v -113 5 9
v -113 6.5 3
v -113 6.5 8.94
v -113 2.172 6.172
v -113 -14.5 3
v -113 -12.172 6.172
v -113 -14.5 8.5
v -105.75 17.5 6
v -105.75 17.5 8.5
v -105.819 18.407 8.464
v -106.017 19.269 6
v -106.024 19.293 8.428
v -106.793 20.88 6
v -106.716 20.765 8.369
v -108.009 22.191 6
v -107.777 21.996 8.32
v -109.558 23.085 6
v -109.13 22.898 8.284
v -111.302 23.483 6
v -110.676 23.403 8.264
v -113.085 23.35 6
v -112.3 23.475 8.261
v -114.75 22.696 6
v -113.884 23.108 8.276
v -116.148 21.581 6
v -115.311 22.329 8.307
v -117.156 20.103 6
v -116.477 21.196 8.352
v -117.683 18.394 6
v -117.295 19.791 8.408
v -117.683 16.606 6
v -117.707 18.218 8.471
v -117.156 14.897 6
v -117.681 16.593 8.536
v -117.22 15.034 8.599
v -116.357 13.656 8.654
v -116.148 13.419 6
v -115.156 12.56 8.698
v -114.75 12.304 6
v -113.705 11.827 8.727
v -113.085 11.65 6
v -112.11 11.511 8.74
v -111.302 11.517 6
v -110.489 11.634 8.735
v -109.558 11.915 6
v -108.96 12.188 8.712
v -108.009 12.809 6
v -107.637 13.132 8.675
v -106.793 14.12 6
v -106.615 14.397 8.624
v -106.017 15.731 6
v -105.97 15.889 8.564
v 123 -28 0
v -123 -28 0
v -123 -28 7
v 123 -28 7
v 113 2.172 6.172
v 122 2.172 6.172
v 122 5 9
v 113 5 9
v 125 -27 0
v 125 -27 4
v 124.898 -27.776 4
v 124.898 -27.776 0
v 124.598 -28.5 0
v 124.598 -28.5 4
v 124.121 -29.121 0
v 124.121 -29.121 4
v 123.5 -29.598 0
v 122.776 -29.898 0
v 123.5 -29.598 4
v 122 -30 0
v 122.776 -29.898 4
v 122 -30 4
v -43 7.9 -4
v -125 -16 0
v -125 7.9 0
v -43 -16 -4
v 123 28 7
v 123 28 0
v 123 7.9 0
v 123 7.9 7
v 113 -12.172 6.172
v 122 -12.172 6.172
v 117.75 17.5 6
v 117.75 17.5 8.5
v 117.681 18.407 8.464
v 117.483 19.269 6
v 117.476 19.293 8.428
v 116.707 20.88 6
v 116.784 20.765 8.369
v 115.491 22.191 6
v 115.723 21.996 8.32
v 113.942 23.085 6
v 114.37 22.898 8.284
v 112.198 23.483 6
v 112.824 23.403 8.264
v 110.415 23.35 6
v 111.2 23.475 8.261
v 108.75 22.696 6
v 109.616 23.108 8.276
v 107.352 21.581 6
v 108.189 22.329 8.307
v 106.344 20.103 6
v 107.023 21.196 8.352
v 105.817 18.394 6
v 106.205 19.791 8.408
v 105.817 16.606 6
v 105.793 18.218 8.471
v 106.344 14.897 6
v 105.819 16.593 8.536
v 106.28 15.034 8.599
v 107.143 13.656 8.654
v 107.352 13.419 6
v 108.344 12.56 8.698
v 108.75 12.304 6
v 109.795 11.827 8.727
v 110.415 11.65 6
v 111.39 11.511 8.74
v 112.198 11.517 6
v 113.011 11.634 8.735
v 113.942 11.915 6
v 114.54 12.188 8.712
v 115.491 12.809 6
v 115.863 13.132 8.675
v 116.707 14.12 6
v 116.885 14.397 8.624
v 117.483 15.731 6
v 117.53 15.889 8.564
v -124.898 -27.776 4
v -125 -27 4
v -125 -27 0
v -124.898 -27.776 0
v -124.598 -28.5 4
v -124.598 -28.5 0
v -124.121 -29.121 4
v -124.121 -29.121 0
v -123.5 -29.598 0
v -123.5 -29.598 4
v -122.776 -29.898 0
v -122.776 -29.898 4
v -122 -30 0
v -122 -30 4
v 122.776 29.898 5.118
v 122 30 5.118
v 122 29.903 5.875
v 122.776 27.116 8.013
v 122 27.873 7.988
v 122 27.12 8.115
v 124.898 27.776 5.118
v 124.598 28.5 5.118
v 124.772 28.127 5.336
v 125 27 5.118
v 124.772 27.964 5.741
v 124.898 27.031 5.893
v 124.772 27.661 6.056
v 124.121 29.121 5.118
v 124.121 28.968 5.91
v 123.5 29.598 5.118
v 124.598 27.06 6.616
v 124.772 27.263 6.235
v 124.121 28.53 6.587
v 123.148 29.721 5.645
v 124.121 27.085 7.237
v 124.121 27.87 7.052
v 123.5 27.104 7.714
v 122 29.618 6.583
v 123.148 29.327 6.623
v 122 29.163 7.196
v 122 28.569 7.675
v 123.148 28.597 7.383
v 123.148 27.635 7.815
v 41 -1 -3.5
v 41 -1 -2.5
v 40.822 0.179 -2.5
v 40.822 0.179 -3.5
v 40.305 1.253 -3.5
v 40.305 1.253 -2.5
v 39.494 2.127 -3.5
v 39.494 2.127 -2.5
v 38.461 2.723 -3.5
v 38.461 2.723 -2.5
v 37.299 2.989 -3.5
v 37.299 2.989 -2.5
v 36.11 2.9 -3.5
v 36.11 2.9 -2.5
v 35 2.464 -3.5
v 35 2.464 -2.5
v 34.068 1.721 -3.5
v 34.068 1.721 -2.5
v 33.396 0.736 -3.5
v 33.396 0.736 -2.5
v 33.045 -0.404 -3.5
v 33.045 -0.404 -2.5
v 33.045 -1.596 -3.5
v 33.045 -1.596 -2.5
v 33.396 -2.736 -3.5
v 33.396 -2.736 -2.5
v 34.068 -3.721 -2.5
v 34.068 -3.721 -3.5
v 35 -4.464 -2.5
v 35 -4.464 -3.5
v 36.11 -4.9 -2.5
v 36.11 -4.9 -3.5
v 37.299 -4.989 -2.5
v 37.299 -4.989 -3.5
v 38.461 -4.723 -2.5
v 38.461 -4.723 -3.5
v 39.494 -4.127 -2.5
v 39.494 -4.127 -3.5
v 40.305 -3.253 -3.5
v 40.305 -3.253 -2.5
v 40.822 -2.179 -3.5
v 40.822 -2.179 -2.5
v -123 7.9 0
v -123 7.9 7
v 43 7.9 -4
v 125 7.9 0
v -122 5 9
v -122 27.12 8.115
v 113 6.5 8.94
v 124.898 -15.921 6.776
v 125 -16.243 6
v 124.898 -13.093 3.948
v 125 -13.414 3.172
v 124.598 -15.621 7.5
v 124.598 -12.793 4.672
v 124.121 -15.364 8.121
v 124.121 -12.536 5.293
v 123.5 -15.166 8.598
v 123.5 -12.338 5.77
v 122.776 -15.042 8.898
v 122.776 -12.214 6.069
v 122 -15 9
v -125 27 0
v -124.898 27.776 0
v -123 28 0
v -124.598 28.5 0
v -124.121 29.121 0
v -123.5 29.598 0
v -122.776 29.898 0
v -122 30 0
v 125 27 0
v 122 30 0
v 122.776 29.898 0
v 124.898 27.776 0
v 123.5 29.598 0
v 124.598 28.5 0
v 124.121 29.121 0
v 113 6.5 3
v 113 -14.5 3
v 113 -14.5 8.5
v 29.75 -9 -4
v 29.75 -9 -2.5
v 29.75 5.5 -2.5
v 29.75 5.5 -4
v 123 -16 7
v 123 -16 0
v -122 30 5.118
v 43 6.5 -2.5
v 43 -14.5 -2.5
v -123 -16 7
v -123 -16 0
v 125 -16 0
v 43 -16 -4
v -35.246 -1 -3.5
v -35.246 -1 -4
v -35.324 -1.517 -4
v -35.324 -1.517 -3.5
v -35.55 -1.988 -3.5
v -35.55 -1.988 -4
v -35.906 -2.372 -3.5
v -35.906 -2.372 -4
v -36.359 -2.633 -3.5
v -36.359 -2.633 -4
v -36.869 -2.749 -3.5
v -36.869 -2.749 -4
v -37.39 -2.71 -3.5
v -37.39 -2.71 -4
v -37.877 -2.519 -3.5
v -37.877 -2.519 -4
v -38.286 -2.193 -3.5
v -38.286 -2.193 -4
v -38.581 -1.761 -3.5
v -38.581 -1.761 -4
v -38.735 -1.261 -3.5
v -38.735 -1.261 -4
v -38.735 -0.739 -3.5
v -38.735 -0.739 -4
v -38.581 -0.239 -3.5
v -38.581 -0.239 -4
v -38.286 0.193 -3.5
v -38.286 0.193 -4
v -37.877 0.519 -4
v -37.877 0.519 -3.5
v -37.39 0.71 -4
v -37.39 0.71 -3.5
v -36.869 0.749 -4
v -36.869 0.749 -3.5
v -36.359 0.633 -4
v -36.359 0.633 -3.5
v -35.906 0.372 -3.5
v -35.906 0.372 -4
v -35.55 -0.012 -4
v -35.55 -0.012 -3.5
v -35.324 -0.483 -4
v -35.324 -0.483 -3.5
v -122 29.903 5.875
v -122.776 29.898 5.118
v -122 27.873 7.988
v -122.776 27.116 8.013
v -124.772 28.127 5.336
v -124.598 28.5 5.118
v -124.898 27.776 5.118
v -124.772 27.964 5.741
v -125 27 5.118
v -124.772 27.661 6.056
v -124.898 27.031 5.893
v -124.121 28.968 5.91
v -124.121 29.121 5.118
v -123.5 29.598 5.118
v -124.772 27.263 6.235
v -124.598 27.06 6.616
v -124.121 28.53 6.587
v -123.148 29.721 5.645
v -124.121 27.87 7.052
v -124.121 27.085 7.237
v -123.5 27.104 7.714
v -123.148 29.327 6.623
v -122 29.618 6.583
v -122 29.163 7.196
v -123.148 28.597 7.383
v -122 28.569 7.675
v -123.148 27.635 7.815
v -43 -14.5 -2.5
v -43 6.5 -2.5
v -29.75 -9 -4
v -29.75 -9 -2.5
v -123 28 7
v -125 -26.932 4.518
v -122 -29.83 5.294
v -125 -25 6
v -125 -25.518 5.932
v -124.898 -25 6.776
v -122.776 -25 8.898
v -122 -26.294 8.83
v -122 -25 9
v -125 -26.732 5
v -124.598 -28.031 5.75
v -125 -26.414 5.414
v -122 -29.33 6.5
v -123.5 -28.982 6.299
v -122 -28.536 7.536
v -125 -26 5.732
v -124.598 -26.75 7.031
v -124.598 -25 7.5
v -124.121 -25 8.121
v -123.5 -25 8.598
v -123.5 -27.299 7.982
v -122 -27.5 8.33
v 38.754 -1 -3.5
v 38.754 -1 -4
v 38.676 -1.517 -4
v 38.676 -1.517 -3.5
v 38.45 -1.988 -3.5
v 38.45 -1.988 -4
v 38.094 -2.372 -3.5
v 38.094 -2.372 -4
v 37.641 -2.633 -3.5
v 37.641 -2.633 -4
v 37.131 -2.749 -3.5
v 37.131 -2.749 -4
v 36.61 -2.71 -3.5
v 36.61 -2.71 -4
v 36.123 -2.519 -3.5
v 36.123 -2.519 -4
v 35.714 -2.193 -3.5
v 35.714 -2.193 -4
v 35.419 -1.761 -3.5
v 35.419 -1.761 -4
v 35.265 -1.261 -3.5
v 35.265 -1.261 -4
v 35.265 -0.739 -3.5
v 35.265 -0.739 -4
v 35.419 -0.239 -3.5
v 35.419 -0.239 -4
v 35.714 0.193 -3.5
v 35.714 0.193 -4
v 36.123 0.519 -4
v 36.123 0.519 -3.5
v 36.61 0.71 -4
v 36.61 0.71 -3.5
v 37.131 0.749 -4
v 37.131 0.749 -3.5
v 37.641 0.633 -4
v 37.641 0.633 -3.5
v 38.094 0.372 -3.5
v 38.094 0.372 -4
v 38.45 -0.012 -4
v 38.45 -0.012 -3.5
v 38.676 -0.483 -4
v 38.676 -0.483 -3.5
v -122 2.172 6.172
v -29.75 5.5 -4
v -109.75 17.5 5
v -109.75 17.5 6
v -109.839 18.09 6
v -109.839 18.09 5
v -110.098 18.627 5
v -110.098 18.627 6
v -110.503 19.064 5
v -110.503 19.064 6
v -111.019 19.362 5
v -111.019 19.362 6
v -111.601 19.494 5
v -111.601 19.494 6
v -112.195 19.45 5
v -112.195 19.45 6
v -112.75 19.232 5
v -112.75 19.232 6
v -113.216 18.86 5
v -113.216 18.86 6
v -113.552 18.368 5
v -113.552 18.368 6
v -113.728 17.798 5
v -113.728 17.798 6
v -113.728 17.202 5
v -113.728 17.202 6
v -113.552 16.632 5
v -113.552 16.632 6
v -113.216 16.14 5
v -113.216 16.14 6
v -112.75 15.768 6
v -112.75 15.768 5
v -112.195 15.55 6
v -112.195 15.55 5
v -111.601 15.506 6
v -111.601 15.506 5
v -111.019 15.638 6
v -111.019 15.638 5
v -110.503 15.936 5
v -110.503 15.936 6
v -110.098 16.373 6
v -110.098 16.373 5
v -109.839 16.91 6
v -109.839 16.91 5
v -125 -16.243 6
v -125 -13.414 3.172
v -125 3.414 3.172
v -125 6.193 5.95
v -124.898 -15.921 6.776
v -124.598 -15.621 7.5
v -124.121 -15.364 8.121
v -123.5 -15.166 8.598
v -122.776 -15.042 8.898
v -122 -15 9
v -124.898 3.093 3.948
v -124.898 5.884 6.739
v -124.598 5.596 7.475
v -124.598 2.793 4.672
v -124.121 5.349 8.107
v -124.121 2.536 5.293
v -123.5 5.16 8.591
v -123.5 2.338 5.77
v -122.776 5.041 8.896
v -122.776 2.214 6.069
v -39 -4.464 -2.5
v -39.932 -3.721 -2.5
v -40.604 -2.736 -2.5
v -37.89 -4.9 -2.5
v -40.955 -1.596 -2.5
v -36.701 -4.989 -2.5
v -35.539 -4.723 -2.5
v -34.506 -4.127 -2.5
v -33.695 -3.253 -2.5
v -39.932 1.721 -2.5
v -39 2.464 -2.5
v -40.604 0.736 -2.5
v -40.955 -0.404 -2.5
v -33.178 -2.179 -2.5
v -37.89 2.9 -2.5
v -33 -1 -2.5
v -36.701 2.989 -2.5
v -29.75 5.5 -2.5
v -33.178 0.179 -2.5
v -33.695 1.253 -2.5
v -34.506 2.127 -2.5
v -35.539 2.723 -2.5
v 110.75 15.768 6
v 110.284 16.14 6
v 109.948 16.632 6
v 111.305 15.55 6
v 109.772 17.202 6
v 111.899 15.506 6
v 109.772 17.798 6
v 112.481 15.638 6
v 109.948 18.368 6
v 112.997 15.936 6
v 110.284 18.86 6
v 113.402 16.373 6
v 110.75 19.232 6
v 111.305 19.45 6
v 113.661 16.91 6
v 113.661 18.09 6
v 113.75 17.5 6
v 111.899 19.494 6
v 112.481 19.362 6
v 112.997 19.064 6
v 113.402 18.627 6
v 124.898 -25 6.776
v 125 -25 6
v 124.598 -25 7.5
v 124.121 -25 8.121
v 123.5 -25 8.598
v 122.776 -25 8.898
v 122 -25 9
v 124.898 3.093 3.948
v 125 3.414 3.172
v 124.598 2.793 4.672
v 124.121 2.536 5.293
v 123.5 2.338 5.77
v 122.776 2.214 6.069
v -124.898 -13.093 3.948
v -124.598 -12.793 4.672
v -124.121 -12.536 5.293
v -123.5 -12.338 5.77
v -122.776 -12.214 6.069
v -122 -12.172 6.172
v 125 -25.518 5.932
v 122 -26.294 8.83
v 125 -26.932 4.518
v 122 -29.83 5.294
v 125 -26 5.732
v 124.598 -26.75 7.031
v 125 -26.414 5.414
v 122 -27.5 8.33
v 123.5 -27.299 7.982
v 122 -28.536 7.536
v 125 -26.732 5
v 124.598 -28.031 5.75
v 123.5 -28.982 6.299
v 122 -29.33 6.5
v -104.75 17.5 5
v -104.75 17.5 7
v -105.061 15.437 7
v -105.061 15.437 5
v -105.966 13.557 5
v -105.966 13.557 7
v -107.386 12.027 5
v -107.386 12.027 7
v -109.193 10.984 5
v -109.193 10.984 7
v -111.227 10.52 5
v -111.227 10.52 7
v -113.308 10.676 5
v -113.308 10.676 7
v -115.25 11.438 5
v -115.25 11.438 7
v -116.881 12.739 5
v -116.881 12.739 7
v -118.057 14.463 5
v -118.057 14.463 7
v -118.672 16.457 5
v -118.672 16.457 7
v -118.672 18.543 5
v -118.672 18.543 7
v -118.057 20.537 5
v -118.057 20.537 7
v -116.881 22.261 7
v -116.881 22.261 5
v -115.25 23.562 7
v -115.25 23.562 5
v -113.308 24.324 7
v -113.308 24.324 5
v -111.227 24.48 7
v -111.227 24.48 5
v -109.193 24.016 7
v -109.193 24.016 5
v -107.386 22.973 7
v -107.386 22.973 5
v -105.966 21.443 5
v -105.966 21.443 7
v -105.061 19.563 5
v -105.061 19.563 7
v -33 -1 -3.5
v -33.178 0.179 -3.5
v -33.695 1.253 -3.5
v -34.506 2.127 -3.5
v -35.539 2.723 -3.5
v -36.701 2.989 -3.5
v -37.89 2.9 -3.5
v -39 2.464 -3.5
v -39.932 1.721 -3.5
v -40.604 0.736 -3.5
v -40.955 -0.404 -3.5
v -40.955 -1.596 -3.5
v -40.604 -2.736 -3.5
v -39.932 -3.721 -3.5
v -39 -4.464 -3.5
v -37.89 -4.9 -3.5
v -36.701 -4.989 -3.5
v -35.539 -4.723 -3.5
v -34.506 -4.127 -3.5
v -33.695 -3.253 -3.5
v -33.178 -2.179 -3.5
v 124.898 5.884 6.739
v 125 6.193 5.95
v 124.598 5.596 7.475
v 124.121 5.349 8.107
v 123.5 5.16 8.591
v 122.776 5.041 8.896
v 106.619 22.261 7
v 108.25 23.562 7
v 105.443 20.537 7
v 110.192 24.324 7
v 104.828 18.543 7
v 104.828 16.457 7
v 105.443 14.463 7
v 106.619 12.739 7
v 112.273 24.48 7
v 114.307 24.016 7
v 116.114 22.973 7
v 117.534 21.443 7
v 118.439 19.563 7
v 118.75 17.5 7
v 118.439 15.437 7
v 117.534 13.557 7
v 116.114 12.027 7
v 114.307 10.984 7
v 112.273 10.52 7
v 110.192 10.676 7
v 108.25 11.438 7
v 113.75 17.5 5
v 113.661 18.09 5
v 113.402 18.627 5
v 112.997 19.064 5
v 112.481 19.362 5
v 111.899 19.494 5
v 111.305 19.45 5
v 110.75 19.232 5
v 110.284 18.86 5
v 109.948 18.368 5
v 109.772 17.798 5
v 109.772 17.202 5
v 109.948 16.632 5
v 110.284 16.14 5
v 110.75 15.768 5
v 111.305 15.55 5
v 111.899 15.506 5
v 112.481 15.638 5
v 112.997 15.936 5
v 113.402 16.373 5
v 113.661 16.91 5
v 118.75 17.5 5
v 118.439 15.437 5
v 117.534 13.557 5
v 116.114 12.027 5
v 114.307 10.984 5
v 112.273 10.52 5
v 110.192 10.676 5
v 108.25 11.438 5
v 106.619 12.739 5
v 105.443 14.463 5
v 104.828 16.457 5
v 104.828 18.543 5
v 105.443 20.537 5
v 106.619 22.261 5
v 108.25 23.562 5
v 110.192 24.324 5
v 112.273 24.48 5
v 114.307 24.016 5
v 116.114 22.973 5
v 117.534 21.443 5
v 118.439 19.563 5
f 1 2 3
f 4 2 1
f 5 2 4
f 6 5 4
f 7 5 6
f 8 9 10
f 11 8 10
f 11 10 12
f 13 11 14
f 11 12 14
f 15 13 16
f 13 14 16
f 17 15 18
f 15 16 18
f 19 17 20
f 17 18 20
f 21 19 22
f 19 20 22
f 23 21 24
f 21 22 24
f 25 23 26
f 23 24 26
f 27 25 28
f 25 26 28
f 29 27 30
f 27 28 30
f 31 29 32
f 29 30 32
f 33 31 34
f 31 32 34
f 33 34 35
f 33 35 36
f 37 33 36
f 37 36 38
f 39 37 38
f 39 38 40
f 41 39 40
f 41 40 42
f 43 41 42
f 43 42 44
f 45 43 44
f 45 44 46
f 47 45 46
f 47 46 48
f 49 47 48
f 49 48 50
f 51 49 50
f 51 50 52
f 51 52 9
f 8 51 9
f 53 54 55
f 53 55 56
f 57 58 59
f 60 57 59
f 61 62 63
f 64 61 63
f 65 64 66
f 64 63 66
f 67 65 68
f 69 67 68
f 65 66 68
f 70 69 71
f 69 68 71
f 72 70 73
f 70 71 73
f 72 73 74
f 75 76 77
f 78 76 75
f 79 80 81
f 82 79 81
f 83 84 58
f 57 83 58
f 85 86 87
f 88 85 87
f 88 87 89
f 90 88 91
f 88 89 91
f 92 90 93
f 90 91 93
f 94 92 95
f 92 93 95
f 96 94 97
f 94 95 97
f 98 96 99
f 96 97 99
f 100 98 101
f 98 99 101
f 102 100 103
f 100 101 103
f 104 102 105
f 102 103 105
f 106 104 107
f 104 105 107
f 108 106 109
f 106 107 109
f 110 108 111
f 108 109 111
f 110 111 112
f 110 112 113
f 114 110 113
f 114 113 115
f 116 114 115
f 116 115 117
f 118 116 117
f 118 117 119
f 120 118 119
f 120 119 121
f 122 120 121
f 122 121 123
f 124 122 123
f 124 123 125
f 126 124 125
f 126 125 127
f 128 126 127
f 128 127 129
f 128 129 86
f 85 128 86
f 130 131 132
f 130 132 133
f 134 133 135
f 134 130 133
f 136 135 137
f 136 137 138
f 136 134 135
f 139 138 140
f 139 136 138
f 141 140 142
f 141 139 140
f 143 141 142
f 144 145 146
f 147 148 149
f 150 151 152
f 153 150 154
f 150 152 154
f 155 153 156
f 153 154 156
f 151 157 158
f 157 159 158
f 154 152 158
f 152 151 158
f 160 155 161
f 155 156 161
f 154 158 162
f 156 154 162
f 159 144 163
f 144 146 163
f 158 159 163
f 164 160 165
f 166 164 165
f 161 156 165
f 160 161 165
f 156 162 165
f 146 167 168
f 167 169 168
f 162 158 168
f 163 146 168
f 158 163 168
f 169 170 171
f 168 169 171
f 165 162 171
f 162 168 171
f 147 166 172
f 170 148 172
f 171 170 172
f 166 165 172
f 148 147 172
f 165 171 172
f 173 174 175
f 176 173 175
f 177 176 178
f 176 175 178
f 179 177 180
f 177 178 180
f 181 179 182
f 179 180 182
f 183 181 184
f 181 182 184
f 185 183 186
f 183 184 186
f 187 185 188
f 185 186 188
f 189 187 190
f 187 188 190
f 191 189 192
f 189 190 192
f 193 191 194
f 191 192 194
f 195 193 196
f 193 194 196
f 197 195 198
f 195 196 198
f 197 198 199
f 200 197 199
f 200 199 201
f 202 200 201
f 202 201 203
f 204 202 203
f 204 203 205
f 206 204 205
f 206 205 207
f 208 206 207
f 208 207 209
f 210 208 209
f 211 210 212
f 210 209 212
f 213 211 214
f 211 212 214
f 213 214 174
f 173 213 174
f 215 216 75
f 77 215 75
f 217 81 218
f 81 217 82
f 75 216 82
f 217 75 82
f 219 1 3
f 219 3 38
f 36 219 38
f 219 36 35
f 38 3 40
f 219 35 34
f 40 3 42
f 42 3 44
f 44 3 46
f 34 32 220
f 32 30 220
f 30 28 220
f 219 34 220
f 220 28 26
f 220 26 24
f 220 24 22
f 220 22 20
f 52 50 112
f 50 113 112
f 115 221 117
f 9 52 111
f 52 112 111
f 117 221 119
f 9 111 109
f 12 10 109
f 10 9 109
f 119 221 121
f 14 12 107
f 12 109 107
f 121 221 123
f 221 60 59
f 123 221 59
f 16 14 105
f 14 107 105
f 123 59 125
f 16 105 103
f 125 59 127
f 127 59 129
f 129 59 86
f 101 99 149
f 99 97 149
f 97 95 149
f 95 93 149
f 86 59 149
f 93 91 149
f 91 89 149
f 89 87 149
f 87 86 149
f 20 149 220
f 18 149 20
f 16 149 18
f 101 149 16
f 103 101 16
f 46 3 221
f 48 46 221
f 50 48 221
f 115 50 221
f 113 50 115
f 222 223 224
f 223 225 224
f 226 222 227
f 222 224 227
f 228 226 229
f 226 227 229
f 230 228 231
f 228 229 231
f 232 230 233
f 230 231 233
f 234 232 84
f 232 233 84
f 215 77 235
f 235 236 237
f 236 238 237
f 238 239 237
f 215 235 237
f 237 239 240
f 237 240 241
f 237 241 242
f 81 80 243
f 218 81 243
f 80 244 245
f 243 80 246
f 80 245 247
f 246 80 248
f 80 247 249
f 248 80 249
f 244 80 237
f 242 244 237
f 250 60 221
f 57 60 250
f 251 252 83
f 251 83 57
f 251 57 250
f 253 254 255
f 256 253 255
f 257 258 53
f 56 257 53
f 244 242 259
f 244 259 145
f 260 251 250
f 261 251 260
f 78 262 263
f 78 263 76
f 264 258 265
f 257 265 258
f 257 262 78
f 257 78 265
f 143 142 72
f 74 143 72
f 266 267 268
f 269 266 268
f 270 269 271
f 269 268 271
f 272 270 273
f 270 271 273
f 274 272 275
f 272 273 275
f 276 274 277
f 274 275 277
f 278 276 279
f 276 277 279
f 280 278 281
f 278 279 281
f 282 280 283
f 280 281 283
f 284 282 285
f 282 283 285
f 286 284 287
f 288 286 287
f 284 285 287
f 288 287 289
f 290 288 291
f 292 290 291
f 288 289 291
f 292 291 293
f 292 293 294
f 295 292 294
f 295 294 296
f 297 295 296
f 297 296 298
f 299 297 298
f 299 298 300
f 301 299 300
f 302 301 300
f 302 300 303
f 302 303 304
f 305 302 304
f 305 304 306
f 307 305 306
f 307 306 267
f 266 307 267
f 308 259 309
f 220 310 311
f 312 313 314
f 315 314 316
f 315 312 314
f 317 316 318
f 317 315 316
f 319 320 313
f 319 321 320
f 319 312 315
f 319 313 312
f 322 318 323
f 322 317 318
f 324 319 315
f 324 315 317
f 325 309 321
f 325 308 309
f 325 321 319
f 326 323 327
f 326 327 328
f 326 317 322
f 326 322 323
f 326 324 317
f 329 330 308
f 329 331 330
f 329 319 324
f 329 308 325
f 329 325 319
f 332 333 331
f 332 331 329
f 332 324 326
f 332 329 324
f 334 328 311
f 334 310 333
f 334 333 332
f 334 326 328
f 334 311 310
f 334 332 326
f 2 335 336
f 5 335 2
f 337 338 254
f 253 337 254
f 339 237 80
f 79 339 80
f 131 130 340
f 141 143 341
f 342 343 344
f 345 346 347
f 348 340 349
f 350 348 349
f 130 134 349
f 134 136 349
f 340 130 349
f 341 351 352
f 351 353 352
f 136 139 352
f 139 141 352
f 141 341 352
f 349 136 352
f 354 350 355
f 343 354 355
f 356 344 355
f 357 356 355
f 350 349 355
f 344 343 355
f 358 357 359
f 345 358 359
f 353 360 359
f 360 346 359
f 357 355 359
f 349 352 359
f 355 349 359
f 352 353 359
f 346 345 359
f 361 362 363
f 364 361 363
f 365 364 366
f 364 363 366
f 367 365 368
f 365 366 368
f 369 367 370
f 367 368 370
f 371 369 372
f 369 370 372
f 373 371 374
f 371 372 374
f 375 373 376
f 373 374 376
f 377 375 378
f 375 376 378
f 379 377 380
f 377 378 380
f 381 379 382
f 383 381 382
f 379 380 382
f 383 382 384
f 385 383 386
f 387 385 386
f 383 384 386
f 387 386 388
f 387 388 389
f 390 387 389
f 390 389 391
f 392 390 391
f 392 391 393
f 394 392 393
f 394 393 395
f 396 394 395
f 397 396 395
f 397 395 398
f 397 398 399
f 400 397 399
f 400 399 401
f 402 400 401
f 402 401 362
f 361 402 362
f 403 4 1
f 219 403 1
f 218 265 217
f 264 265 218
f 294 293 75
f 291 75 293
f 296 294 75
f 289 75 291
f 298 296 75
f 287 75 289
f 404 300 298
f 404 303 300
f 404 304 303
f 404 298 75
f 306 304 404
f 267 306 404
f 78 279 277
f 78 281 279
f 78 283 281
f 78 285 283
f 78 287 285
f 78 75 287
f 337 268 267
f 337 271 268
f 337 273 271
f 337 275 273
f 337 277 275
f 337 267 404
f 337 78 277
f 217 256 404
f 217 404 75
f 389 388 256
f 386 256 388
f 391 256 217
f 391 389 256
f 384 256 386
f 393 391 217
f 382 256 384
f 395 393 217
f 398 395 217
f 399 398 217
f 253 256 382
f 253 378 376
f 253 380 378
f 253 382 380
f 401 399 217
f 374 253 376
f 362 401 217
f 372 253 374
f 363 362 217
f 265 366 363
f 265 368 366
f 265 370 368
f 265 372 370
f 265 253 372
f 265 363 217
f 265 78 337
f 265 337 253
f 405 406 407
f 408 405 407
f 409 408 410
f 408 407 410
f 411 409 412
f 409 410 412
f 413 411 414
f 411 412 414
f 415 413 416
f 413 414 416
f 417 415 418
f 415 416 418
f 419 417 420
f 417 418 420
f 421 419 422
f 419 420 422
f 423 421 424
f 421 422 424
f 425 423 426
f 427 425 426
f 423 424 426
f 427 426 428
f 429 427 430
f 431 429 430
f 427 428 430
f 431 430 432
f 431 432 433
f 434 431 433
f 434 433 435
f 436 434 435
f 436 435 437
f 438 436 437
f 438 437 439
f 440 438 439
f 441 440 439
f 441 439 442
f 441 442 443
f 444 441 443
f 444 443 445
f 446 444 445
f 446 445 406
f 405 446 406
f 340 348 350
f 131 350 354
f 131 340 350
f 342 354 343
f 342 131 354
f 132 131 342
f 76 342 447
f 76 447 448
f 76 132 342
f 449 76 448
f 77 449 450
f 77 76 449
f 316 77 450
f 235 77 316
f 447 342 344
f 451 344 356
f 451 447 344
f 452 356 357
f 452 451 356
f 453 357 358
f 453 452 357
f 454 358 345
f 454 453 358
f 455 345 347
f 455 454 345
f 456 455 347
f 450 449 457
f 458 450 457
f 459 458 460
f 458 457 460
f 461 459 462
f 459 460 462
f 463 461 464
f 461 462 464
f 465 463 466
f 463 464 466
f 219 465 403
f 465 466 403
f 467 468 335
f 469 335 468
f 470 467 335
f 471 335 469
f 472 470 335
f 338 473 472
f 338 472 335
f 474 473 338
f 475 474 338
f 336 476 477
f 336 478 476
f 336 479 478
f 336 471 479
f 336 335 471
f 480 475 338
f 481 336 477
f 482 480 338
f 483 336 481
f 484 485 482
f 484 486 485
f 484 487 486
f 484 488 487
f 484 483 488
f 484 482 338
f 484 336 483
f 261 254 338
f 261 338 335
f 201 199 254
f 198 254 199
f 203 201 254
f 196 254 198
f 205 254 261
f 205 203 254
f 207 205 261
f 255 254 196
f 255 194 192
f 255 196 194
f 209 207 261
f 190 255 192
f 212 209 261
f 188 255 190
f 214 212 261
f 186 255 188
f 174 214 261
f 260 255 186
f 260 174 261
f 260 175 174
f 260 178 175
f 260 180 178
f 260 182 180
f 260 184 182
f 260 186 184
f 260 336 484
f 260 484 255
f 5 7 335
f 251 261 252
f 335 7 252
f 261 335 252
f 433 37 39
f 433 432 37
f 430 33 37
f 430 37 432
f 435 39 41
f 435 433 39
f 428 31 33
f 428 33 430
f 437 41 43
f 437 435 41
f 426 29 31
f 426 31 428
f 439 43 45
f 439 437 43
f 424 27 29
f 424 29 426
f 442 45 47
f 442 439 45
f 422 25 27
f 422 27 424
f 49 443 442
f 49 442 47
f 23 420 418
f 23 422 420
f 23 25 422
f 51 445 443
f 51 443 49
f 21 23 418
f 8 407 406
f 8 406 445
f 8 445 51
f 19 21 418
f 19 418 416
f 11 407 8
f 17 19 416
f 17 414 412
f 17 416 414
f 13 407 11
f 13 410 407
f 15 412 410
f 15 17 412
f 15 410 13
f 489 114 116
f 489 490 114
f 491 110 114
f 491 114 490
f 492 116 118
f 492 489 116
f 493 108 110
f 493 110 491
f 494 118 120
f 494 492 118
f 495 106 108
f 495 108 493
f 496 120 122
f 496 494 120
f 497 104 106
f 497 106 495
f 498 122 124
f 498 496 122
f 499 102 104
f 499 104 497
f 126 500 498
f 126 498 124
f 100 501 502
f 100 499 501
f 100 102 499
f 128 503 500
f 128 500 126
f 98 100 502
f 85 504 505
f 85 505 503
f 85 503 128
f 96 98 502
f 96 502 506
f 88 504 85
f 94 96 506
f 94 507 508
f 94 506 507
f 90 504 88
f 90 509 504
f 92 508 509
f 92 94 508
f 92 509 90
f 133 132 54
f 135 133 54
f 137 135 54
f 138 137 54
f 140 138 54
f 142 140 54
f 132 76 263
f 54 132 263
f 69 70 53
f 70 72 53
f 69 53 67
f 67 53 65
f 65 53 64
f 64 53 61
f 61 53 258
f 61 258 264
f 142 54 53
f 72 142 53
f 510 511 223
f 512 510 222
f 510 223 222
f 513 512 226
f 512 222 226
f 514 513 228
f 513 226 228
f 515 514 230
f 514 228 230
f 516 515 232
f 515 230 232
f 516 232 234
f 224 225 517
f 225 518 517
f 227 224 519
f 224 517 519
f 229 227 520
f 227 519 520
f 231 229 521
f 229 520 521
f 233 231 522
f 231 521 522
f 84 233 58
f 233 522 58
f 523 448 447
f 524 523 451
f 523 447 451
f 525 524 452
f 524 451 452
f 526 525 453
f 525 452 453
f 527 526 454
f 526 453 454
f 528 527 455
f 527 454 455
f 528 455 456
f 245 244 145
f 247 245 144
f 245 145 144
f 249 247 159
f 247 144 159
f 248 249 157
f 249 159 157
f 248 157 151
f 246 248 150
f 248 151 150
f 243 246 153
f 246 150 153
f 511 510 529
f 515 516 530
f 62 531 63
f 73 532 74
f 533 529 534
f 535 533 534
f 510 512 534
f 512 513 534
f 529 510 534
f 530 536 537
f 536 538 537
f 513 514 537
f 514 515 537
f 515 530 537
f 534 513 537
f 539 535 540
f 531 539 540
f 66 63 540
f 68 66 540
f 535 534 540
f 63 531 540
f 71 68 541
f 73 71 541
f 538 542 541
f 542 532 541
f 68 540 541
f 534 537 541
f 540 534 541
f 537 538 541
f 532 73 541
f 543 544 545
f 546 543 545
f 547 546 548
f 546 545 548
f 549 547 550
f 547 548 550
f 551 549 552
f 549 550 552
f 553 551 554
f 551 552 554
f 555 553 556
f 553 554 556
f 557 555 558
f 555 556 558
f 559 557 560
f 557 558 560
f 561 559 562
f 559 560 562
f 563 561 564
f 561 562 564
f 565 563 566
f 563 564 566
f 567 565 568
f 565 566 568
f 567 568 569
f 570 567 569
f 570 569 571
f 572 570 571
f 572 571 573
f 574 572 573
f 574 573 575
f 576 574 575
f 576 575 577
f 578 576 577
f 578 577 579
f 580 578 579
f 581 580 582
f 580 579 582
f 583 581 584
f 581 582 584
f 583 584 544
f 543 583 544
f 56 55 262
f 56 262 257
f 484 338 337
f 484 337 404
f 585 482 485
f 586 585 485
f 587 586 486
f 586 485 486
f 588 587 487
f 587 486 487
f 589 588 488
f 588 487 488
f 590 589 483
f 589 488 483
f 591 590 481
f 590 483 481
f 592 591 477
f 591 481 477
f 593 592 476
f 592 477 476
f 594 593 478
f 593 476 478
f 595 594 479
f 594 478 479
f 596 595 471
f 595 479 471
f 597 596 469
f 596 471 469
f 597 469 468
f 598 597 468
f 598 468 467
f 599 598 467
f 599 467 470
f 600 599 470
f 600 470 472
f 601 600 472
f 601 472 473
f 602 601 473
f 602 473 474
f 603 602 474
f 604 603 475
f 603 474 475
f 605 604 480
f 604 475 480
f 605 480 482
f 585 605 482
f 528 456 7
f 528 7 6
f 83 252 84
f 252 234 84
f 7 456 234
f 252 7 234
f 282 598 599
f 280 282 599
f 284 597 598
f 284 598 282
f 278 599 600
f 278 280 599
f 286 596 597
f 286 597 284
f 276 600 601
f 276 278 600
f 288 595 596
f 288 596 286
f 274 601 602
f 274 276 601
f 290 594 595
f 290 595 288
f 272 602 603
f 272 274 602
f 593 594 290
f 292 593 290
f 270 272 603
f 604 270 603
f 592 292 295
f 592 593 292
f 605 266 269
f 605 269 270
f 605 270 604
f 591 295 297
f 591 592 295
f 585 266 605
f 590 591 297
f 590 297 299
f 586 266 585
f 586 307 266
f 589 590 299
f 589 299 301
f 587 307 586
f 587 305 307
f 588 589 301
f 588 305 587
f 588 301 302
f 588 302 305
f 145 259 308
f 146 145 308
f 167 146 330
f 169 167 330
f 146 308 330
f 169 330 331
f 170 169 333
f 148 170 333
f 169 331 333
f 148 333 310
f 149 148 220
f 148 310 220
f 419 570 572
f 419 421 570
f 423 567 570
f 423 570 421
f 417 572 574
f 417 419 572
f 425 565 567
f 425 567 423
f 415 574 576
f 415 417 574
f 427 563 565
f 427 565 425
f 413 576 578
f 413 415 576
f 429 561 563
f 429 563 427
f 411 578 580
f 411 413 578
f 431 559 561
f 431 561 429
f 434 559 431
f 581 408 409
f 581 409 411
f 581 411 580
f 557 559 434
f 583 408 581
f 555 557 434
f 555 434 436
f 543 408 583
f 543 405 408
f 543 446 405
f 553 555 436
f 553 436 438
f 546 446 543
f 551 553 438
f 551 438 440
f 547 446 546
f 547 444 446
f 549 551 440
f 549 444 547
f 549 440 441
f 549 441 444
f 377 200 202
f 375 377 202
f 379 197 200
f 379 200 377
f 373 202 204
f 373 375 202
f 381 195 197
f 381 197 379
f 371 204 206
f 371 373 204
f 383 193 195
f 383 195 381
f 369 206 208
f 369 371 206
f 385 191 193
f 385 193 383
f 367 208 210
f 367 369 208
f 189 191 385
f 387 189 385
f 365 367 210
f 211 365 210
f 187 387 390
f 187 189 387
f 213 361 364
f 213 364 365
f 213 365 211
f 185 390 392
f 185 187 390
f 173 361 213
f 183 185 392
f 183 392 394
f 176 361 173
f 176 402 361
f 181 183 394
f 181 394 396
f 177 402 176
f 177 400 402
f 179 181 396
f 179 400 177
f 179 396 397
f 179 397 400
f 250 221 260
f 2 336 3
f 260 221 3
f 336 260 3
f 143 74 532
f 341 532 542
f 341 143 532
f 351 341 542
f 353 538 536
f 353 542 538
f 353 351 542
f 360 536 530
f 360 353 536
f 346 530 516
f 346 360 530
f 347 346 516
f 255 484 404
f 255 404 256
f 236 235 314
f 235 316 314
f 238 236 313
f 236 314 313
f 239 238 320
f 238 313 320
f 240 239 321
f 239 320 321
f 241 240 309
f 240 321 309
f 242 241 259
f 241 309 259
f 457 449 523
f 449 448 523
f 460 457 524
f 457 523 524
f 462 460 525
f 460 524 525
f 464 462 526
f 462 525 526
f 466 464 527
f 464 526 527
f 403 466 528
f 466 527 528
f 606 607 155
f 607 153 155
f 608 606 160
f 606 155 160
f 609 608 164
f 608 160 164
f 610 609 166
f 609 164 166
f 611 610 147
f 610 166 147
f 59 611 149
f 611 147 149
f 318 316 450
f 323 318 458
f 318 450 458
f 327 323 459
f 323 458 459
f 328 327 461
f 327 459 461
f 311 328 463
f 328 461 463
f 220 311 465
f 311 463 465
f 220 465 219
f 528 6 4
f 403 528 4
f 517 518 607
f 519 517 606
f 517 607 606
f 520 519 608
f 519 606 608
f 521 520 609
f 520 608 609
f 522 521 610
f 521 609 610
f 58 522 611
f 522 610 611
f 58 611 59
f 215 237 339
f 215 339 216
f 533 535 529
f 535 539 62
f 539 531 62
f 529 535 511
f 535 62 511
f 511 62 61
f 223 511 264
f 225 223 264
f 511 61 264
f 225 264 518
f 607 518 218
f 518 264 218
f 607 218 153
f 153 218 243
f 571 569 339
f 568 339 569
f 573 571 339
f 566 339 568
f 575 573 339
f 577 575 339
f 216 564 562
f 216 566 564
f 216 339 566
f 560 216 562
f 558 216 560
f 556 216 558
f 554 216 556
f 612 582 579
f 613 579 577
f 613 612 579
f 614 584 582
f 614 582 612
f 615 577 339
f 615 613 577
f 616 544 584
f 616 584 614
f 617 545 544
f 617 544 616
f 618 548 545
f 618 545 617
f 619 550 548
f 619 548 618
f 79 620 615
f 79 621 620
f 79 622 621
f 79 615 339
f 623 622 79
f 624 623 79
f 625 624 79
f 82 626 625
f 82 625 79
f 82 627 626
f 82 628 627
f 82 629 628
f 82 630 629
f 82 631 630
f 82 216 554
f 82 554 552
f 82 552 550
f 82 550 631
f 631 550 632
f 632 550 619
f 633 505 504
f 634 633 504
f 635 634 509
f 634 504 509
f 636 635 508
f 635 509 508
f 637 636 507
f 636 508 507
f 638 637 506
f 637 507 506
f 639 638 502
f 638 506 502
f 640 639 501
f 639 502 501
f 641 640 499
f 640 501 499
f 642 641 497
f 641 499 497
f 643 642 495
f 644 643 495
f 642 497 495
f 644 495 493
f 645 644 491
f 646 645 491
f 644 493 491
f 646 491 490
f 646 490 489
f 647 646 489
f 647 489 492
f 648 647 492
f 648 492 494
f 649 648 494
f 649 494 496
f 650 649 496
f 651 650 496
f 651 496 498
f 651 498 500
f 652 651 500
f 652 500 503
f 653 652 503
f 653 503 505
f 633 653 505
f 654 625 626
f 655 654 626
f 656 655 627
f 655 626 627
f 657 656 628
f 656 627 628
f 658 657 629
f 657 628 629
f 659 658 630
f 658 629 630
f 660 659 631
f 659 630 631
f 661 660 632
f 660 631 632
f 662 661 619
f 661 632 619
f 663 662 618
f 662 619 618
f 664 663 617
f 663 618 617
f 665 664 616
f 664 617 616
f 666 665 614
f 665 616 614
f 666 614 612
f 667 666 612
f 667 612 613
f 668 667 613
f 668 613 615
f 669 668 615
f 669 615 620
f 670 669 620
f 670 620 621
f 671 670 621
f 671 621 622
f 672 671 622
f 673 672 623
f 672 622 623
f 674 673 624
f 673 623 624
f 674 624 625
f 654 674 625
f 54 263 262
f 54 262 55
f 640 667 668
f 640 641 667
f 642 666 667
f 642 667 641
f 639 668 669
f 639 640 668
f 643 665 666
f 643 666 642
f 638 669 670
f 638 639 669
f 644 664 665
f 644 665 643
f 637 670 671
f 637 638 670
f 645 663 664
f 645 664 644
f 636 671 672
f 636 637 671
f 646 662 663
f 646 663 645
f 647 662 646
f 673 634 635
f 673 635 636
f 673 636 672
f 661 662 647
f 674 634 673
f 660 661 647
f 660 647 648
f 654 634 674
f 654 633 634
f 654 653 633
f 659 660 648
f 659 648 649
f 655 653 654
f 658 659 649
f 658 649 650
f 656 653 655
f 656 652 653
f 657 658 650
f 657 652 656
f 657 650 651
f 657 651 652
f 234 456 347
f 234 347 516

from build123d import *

# Parameters (mm, degrees)
F0_W         = 250
F0_H         = 60
F1_DEPTH     = 9
F2_W         = 86
F2_H         = 4
F3_DEPTH     = 16
F4_DEPTH     = 7.9
F5_W         = 59.5
F5_H         = 14.5
F6_DEPTH     = 13.001
F7_R         = 1.7543464605
F8_DEPTH     = 13.001
F9_W         = 246
F9_H         = 20.1
F9_H_2       = 12
F10_DEPTH    = 7
F11_R        = 1.9
F12_DEPTH    = 2.001
F14_R        = 7
F15_DEPTH    = 2
F13_R        = 6
F16_DEPTH    = 3
F17_R        = 2
F18_DEPTH    = 25
F19_W        = 86
F19_H        = 21
F20_DEPTH    = 11.5
F22_DEPTH    = 21
F24_DEPTH    = 250.001
F25_R        = 3
F26_T1_DEPTH = 250
F26_T4_ANGLE = 90
F26_T6_ANGLE = 90
F27_R        = 4
F28_DEPTH    = 1


# Not quite as in the source:
# - a fillet or chamfer that OpenCascade refuses, or shapes differently, is made with other operations: its cross-section is extruded or revolved along the edge and cut away or added


with BuildPart() as f1:
    # F0 (on Top) → F1 (new body)
    with BuildSketch(Plane.XY):
        Rectangle(F0_W, F0_H)
    extrude(amount=F1_DEPTH)

    # F2 (on Front) → F3 (join)
    with BuildSketch(Plane.XZ):
        Polygon((-43, 0), (-125, 0), (-43, -4), align=None)
        with Locations((0, -2)):
            Rectangle(F2_W, F2_H)
        Polygon((125, 0), (43, 0), (43, -4), align=None)
    extrude(amount=F3_DEPTH)

    # F2 (on Front) → F4 (join)
    with BuildSketch(Plane.XZ):
        Polygon((-43, 0), (-125, 0), (-43, -4), align=None)
        with Locations((0, -2)):
            Rectangle(F2_W, F2_H)
        Polygon((125, 0), (43, 0), (43, -4), align=None)
    extrude(amount=-F4_DEPTH)

    # F5 (on face) → F6 (cut, through all)
    with BuildSketch(Plane.XY.offset(9)):
        with Locations((0, -1.75)):
            Rectangle(F5_W, F5_H)
    extrude(amount=-F6_DEPTH, mode=Mode.SUBTRACT)

    # F7 (on face) → F8 (cut, through all)
    with BuildSketch(Plane(origin=(0, 0, -4), x_dir=(1, 0, 0), z_dir=(0, 0, -1))):
        with Locations((-37, 1)):
            Circle(F7_R)
        with Locations((37, 1)):
            Circle(F7_R)
    extrude(amount=-F8_DEPTH, mode=Mode.SUBTRACT)

    # F9 (on face) → F10 (cut)
    with BuildSketch(Plane(origin=(0, 0, 0), x_dir=(1, 0, 0), z_dir=(0, 0, -1))):
        with Locations((0, -17.95)):
            Rectangle(F9_W, F9_H)
        with Locations((0, 22)):
            Rectangle(F9_W, F9_H_2)
    extrude(amount=-F10_DEPTH, mode=Mode.SUBTRACT)

    # F11 (on face) → F12 (cut, through all)
    with BuildSketch(Plane(origin=(0, 0, 7), x_dir=(1, 0, 0), z_dir=(0, 0, -1))):
        with Locations((-111.75, -17.5)):
            Circle(F11_R)
        with Locations((111.75, -17.5)):
            Circle(F11_R)
    extrude(amount=-F12_DEPTH, mode=Mode.SUBTRACT)

    # F14 (on face) → F15 (join)
    with BuildSketch(Plane(origin=(0, 0, 7), x_dir=(1, 0, 0), z_dir=(0, 0, -1))):
        with Locations((-111.75, -17.5)):
            Circle(F14_R)
        with Locations((111.75, -17.5)):
            Circle(F14_R)
    extrude(amount=F15_DEPTH)

    # F13 (on face) → F16 (cut)
    with BuildSketch(Plane.XY.offset(9)):
        with Locations((-111.75, 17.5)):
            Circle(F13_R)
        with Locations((111.75, 17.5)):
            Circle(F13_R)
    extrude(amount=-F16_DEPTH, mode=Mode.SUBTRACT)

    # F17 (on face) → F18 (cut)
    with BuildSketch(Plane.XY.offset(6)):
        with Locations((111.75, 17.5)):
            Circle(F17_R)
        with Locations((-111.75, 17.5)):
            Circle(F17_R)
    extrude(amount=-F18_DEPTH, mode=Mode.SUBTRACT)

    # F19 (on face) → F20 (cut)
    with BuildSketch(Plane.XY.offset(9)):
        with Locations((0, -4)):
            Rectangle(F19_W, F19_H)
    extrude(amount=-F20_DEPTH, mode=Mode.SUBTRACT)

    # F21 (on face) → F22 (cut)
    with BuildSketch(Plane(origin=(0, -14.5, 0), x_dir=(-1, 0, 0), z_dir=(0, 1, 0))):
        Polygon((113, 9), (43, 9), (43, -2.5), (113, 3), align=None)
        Polygon((-43, -2.5), (-43, 9), (-113, 9), (-113, 3), align=None)
    extrude(amount=F22_DEPTH, mode=Mode.SUBTRACT)

    # F23 (on face) → F24 (cut, through all)
    with BuildSketch(Plane.YZ.offset(125)):
        Polygon((2.1715728753, 6.1715728753), (5, 9), (-15, 9), (-12.1715728753, 6.1715728753), align=None)
        Polygon((5, 9), (30, 8), (30, 9), align=None)
    extrude(amount=-F24_DEPTH, mode=Mode.SUBTRACT)

    # F25
    f25_edges = [f1.edges().sort_by_distance(p)[0] for p in [
        (125, -22.5, 9),
        (0, 30, 8),
        (-125, -22.5, 9),
        (125, -13.585786, 7.585786),
        (125, -5, 6.171573),
        (125, 3.585786, 7.585786),
        (-125, 3.585786, 7.585786),
        (-125, -5, 6.171573),
        (-125, -13.585786, 7.585786),
        (-125, 30, 4),
        (-125, -30, 4.5),
        (125, -30, 4.5),
        (125, 30, 4),
        (125, 17.5, 8.5),
        (-125, 17.5, 8.5),
    ]]
    fillet(f25_edges, radius=F25_R)

    # F26: fillet of radius 5 on 1 edges, made by hand

    # F26_s2 → F26_t1 (cut)
    with BuildSketch(Plane.YZ.offset(-125)):
        with BuildLine():
            ThreePointArc((-30, 4), (-28.5355339059, 7.5355339059), (-25, 9))
            Line((-25, 9), (-30, 9))
            Line((-30, 9), (-30, 4))
        make_face()
    extrude(amount=F26_T1_DEPTH, mode=Mode.SUBTRACT)

    # F26_s3 → F26_t4 (revolve, cut)
    with BuildSketch(Plane.XY.offset(4)):
        with BuildLine():
            ThreePointArc((-125, -27), (-124.1213203436, -29.1213203436), (-122, -30))
            Line((-122, -30), (-125, -30))
            Line((-125, -30), (-125, -27))
        make_face()
    revolve(axis=Axis((-125, -25, 4), (-1, 0, 0)), revolution_arc=F26_T4_ANGLE, mode=Mode.SUBTRACT)

    # F26_s5 → F26_t6 (revolve, cut)
    with BuildSketch(Plane.XZ.offset(25)):
        with BuildLine():
            ThreePointArc((125, 6), (124.1213203436, 8.1213203436), (122, 9))
            Line((122, 9), (125, 9))
            Line((125, 9), (125, 6))
        make_face()
    revolve(axis=Axis((125, -25, 4), (1, 0, 0)), revolution_arc=F26_T6_ANGLE, mode=Mode.SUBTRACT)

    # F27 (on face) → F28 (cut)
    with BuildSketch(Plane.XY.offset(-2.5)):
        with Locations((37, -1)):
            Circle(F27_R)
        with Locations((-37, -1)):
            Circle(F27_R)
    extrude(amount=-F28_DEPTH, mode=Mode.SUBTRACT)


solid = f1.part
